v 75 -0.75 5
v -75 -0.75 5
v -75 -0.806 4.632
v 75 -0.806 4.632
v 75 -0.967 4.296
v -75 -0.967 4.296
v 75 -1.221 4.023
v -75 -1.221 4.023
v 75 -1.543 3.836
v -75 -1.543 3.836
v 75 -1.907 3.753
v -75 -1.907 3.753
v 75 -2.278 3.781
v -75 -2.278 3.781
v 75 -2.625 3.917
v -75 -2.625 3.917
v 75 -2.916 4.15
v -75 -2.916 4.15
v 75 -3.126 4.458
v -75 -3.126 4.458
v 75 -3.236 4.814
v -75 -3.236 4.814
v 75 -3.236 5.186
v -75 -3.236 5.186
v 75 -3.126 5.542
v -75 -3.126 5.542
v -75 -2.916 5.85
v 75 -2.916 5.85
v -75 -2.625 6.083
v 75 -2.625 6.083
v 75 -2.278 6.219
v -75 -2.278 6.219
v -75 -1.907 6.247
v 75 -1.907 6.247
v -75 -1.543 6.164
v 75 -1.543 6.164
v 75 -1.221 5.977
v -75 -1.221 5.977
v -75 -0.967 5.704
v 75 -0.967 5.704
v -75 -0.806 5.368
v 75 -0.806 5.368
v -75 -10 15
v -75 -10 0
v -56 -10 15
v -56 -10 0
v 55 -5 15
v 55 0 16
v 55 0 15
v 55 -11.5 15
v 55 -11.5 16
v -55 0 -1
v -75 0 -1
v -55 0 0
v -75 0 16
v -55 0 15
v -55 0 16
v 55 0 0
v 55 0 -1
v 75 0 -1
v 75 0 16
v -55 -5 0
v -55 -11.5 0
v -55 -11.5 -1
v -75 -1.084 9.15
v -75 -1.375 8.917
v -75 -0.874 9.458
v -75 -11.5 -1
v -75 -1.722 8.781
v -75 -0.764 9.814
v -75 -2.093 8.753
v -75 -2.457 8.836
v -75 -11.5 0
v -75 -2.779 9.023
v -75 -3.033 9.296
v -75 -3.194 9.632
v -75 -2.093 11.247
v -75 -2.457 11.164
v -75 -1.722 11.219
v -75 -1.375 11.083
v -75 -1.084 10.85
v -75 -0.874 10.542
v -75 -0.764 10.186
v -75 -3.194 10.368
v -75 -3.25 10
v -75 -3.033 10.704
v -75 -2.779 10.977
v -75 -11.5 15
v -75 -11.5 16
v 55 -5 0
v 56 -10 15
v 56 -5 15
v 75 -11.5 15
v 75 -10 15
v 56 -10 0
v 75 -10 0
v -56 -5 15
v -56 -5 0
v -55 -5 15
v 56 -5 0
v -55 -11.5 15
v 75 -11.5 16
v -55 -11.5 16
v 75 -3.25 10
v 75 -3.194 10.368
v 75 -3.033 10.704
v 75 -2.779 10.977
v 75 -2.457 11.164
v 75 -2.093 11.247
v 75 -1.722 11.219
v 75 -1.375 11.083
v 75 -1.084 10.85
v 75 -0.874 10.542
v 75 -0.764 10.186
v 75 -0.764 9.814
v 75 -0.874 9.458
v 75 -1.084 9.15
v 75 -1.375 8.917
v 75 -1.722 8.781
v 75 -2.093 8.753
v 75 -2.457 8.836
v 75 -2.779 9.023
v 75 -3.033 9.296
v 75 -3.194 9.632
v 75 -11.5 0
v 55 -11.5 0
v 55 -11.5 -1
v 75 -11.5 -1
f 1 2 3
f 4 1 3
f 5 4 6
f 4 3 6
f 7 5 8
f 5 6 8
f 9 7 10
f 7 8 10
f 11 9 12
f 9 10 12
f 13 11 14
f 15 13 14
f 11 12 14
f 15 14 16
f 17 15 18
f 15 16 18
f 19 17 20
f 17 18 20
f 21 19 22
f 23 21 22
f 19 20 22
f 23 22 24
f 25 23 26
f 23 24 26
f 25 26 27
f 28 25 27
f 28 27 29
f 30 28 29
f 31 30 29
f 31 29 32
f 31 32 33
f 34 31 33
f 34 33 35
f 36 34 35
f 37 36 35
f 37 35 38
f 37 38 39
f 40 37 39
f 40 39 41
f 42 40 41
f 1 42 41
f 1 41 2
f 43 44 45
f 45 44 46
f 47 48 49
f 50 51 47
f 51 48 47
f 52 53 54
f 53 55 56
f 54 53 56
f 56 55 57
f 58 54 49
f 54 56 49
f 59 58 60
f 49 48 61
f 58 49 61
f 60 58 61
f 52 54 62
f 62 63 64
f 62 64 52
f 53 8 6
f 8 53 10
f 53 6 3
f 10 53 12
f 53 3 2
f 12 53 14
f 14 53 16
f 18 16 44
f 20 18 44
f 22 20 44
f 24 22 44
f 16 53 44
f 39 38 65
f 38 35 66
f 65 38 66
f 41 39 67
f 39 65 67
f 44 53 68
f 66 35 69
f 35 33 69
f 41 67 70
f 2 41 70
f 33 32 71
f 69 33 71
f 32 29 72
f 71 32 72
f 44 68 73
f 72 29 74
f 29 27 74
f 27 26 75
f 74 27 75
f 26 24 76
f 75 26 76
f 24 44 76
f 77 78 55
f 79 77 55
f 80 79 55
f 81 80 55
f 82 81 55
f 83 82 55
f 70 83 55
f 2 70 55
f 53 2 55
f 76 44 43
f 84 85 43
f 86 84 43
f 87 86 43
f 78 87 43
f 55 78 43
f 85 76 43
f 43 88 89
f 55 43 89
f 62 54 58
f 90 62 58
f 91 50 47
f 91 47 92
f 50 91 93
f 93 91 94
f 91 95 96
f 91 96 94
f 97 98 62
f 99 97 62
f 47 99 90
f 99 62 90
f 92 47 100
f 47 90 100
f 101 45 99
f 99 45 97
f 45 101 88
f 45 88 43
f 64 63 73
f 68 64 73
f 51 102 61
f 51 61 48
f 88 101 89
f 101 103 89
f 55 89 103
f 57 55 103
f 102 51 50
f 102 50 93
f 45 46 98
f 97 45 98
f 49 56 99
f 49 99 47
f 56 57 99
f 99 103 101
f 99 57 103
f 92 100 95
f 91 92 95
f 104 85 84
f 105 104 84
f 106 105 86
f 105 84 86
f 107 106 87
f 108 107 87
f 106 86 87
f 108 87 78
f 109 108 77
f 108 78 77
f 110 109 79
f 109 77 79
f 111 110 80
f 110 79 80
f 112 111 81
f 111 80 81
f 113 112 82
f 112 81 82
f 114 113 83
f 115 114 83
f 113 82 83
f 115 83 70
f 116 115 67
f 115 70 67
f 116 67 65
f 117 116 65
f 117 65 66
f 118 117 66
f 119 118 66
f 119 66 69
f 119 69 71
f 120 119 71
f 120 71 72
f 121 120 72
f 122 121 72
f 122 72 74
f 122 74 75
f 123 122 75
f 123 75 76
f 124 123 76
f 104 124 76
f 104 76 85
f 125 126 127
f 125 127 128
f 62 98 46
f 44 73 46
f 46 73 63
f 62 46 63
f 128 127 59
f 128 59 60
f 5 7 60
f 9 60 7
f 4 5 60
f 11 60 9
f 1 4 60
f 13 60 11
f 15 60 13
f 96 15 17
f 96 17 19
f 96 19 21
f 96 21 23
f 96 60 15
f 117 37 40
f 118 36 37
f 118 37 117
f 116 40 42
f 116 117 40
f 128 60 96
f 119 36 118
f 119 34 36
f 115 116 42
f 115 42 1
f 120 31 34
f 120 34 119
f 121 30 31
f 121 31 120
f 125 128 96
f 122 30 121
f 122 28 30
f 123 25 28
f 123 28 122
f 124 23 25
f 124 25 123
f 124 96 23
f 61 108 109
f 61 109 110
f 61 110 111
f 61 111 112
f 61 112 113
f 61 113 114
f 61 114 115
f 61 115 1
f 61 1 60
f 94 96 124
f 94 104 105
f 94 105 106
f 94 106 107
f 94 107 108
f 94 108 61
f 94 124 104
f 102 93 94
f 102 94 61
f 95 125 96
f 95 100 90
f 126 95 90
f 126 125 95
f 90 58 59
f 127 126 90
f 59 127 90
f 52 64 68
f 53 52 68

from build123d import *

# Parameters (mm, degrees)
AUFSATZ_LINEAR_AUSTRAGEN1_DEPTH             = 15
AUFSATZ_LINEAR_AUSTRAGEN4_DEPTH             = 1.5
AUFSATZ_LINEAR_AUSTRAGEN4_DIRECTION_2_REACH = 78.164
SKIZZE6_R                                   = 1.25
SKIZZE6_W                                   = 15
SKIZZE6_H                                   = 1.5
SCHNITT_LINEAR_AUSTRAGEN1_DEPTH             = 152.28863143


with BuildPart() as part:
    # Skizze1 → Aufsatz-Linear austragen1 (new body)
    with BuildSketch(Plane.XY):
        Polygon((-74, 0), (-74, -10), (-56, -10), (-56, -5), (56, -5), (56, -10), (74, -10), (74, 0), align=None)
    extrude(amount=AUFSATZ_LINEAR_AUSTRAGEN1_DEPTH)

    # Skizze5 → Aufsatz-Linear austragen4 (add)
    with BuildSketch(Plane.XZ.offset(10)):
        Polygon((56, 0), (55, 0), (55, -1), (56, -1), (75, -1), (75, 16), (56, 16), (55, 16), (55, 15), (56, 15), (74, 15), (74, 0), align=None)
    aufsatz_linear_austragen4 = extrude(amount=AUFSATZ_LINEAR_AUSTRAGEN4_DEPTH)

    # Aufsatz-Linear austragen4 direction 2: up to this face of the body (flat: up to its plane)
    aufsatz_linear_austragen4_direction_2_end = Plane(part.part.faces().sort_by_distance((0, 0, 7.5))[0])
    # Skizze5 → Aufsatz-Linear austragen4 direction 2 (add, up to the picked face)
    with BuildSketch(Plane.XZ.offset(10), mode=Mode.PRIVATE) as aufsatz_linear_austragen4_direction_2_sk1:
        Polygon((56, 0), (55, 0), (55, -1), (56, -1), (75, -1), (75, 16), (56, 16), (55, 16), (55, 15), (56, 15), (74, 15), (74, 0), align=None)
    aufsatz_linear_austragen4_direction_2_tool1 = split(extrude(aufsatz_linear_austragen4_direction_2_sk1.sketch, amount=-AUFSATZ_LINEAR_AUSTRAGEN4_DIRECTION_2_REACH, mode=Mode.PRIVATE), bisect_by=aufsatz_linear_austragen4_direction_2_end, keep=Keep.BOTH, mode=Mode.PRIVATE)
    aufsatz_linear_austragen4_direction_2 = aufsatz_linear_austragen4_direction_2_tool1.solids().sort_by(Axis((55.5, -10, -0.262488), (0, 1, 0)))[0]
    add(aufsatz_linear_austragen4_direction_2)

    # Spiegeln1: Aufsatz-Linear austragen4, Aufsatz-Linear austragen4 direction 2 across plane
    add(aufsatz_linear_austragen4.mirror(Plane(origin=(0, 0, 0), x_dir=(0, 0, 1), z_dir=(1, 0, 0))))
    add(aufsatz_linear_austragen4_direction_2.mirror(Plane(origin=(0, 0, 0), x_dir=(0, 0, 1), z_dir=(1, 0, 0))))

    # Skizze6 → Schnitt-Linear austragen1 (cut, through all)
    with BuildSketch(Plane.ZY.offset(75)):
        with Locations(Location((10, -2, 0), (0, 0, 270))):
            Circle(SKIZZE6_R)
        with Locations(Location((5, -2, 0), (0, 0, 90))):
            Circle(SKIZZE6_R)
        with Locations((7.5, -10.75)):
            Rectangle(SKIZZE6_W, SKIZZE6_H)
    extrude(amount=-SCHNITT_LINEAR_AUSTRAGEN1_DEPTH, mode=Mode.SUBTRACT)


solid = part.part
